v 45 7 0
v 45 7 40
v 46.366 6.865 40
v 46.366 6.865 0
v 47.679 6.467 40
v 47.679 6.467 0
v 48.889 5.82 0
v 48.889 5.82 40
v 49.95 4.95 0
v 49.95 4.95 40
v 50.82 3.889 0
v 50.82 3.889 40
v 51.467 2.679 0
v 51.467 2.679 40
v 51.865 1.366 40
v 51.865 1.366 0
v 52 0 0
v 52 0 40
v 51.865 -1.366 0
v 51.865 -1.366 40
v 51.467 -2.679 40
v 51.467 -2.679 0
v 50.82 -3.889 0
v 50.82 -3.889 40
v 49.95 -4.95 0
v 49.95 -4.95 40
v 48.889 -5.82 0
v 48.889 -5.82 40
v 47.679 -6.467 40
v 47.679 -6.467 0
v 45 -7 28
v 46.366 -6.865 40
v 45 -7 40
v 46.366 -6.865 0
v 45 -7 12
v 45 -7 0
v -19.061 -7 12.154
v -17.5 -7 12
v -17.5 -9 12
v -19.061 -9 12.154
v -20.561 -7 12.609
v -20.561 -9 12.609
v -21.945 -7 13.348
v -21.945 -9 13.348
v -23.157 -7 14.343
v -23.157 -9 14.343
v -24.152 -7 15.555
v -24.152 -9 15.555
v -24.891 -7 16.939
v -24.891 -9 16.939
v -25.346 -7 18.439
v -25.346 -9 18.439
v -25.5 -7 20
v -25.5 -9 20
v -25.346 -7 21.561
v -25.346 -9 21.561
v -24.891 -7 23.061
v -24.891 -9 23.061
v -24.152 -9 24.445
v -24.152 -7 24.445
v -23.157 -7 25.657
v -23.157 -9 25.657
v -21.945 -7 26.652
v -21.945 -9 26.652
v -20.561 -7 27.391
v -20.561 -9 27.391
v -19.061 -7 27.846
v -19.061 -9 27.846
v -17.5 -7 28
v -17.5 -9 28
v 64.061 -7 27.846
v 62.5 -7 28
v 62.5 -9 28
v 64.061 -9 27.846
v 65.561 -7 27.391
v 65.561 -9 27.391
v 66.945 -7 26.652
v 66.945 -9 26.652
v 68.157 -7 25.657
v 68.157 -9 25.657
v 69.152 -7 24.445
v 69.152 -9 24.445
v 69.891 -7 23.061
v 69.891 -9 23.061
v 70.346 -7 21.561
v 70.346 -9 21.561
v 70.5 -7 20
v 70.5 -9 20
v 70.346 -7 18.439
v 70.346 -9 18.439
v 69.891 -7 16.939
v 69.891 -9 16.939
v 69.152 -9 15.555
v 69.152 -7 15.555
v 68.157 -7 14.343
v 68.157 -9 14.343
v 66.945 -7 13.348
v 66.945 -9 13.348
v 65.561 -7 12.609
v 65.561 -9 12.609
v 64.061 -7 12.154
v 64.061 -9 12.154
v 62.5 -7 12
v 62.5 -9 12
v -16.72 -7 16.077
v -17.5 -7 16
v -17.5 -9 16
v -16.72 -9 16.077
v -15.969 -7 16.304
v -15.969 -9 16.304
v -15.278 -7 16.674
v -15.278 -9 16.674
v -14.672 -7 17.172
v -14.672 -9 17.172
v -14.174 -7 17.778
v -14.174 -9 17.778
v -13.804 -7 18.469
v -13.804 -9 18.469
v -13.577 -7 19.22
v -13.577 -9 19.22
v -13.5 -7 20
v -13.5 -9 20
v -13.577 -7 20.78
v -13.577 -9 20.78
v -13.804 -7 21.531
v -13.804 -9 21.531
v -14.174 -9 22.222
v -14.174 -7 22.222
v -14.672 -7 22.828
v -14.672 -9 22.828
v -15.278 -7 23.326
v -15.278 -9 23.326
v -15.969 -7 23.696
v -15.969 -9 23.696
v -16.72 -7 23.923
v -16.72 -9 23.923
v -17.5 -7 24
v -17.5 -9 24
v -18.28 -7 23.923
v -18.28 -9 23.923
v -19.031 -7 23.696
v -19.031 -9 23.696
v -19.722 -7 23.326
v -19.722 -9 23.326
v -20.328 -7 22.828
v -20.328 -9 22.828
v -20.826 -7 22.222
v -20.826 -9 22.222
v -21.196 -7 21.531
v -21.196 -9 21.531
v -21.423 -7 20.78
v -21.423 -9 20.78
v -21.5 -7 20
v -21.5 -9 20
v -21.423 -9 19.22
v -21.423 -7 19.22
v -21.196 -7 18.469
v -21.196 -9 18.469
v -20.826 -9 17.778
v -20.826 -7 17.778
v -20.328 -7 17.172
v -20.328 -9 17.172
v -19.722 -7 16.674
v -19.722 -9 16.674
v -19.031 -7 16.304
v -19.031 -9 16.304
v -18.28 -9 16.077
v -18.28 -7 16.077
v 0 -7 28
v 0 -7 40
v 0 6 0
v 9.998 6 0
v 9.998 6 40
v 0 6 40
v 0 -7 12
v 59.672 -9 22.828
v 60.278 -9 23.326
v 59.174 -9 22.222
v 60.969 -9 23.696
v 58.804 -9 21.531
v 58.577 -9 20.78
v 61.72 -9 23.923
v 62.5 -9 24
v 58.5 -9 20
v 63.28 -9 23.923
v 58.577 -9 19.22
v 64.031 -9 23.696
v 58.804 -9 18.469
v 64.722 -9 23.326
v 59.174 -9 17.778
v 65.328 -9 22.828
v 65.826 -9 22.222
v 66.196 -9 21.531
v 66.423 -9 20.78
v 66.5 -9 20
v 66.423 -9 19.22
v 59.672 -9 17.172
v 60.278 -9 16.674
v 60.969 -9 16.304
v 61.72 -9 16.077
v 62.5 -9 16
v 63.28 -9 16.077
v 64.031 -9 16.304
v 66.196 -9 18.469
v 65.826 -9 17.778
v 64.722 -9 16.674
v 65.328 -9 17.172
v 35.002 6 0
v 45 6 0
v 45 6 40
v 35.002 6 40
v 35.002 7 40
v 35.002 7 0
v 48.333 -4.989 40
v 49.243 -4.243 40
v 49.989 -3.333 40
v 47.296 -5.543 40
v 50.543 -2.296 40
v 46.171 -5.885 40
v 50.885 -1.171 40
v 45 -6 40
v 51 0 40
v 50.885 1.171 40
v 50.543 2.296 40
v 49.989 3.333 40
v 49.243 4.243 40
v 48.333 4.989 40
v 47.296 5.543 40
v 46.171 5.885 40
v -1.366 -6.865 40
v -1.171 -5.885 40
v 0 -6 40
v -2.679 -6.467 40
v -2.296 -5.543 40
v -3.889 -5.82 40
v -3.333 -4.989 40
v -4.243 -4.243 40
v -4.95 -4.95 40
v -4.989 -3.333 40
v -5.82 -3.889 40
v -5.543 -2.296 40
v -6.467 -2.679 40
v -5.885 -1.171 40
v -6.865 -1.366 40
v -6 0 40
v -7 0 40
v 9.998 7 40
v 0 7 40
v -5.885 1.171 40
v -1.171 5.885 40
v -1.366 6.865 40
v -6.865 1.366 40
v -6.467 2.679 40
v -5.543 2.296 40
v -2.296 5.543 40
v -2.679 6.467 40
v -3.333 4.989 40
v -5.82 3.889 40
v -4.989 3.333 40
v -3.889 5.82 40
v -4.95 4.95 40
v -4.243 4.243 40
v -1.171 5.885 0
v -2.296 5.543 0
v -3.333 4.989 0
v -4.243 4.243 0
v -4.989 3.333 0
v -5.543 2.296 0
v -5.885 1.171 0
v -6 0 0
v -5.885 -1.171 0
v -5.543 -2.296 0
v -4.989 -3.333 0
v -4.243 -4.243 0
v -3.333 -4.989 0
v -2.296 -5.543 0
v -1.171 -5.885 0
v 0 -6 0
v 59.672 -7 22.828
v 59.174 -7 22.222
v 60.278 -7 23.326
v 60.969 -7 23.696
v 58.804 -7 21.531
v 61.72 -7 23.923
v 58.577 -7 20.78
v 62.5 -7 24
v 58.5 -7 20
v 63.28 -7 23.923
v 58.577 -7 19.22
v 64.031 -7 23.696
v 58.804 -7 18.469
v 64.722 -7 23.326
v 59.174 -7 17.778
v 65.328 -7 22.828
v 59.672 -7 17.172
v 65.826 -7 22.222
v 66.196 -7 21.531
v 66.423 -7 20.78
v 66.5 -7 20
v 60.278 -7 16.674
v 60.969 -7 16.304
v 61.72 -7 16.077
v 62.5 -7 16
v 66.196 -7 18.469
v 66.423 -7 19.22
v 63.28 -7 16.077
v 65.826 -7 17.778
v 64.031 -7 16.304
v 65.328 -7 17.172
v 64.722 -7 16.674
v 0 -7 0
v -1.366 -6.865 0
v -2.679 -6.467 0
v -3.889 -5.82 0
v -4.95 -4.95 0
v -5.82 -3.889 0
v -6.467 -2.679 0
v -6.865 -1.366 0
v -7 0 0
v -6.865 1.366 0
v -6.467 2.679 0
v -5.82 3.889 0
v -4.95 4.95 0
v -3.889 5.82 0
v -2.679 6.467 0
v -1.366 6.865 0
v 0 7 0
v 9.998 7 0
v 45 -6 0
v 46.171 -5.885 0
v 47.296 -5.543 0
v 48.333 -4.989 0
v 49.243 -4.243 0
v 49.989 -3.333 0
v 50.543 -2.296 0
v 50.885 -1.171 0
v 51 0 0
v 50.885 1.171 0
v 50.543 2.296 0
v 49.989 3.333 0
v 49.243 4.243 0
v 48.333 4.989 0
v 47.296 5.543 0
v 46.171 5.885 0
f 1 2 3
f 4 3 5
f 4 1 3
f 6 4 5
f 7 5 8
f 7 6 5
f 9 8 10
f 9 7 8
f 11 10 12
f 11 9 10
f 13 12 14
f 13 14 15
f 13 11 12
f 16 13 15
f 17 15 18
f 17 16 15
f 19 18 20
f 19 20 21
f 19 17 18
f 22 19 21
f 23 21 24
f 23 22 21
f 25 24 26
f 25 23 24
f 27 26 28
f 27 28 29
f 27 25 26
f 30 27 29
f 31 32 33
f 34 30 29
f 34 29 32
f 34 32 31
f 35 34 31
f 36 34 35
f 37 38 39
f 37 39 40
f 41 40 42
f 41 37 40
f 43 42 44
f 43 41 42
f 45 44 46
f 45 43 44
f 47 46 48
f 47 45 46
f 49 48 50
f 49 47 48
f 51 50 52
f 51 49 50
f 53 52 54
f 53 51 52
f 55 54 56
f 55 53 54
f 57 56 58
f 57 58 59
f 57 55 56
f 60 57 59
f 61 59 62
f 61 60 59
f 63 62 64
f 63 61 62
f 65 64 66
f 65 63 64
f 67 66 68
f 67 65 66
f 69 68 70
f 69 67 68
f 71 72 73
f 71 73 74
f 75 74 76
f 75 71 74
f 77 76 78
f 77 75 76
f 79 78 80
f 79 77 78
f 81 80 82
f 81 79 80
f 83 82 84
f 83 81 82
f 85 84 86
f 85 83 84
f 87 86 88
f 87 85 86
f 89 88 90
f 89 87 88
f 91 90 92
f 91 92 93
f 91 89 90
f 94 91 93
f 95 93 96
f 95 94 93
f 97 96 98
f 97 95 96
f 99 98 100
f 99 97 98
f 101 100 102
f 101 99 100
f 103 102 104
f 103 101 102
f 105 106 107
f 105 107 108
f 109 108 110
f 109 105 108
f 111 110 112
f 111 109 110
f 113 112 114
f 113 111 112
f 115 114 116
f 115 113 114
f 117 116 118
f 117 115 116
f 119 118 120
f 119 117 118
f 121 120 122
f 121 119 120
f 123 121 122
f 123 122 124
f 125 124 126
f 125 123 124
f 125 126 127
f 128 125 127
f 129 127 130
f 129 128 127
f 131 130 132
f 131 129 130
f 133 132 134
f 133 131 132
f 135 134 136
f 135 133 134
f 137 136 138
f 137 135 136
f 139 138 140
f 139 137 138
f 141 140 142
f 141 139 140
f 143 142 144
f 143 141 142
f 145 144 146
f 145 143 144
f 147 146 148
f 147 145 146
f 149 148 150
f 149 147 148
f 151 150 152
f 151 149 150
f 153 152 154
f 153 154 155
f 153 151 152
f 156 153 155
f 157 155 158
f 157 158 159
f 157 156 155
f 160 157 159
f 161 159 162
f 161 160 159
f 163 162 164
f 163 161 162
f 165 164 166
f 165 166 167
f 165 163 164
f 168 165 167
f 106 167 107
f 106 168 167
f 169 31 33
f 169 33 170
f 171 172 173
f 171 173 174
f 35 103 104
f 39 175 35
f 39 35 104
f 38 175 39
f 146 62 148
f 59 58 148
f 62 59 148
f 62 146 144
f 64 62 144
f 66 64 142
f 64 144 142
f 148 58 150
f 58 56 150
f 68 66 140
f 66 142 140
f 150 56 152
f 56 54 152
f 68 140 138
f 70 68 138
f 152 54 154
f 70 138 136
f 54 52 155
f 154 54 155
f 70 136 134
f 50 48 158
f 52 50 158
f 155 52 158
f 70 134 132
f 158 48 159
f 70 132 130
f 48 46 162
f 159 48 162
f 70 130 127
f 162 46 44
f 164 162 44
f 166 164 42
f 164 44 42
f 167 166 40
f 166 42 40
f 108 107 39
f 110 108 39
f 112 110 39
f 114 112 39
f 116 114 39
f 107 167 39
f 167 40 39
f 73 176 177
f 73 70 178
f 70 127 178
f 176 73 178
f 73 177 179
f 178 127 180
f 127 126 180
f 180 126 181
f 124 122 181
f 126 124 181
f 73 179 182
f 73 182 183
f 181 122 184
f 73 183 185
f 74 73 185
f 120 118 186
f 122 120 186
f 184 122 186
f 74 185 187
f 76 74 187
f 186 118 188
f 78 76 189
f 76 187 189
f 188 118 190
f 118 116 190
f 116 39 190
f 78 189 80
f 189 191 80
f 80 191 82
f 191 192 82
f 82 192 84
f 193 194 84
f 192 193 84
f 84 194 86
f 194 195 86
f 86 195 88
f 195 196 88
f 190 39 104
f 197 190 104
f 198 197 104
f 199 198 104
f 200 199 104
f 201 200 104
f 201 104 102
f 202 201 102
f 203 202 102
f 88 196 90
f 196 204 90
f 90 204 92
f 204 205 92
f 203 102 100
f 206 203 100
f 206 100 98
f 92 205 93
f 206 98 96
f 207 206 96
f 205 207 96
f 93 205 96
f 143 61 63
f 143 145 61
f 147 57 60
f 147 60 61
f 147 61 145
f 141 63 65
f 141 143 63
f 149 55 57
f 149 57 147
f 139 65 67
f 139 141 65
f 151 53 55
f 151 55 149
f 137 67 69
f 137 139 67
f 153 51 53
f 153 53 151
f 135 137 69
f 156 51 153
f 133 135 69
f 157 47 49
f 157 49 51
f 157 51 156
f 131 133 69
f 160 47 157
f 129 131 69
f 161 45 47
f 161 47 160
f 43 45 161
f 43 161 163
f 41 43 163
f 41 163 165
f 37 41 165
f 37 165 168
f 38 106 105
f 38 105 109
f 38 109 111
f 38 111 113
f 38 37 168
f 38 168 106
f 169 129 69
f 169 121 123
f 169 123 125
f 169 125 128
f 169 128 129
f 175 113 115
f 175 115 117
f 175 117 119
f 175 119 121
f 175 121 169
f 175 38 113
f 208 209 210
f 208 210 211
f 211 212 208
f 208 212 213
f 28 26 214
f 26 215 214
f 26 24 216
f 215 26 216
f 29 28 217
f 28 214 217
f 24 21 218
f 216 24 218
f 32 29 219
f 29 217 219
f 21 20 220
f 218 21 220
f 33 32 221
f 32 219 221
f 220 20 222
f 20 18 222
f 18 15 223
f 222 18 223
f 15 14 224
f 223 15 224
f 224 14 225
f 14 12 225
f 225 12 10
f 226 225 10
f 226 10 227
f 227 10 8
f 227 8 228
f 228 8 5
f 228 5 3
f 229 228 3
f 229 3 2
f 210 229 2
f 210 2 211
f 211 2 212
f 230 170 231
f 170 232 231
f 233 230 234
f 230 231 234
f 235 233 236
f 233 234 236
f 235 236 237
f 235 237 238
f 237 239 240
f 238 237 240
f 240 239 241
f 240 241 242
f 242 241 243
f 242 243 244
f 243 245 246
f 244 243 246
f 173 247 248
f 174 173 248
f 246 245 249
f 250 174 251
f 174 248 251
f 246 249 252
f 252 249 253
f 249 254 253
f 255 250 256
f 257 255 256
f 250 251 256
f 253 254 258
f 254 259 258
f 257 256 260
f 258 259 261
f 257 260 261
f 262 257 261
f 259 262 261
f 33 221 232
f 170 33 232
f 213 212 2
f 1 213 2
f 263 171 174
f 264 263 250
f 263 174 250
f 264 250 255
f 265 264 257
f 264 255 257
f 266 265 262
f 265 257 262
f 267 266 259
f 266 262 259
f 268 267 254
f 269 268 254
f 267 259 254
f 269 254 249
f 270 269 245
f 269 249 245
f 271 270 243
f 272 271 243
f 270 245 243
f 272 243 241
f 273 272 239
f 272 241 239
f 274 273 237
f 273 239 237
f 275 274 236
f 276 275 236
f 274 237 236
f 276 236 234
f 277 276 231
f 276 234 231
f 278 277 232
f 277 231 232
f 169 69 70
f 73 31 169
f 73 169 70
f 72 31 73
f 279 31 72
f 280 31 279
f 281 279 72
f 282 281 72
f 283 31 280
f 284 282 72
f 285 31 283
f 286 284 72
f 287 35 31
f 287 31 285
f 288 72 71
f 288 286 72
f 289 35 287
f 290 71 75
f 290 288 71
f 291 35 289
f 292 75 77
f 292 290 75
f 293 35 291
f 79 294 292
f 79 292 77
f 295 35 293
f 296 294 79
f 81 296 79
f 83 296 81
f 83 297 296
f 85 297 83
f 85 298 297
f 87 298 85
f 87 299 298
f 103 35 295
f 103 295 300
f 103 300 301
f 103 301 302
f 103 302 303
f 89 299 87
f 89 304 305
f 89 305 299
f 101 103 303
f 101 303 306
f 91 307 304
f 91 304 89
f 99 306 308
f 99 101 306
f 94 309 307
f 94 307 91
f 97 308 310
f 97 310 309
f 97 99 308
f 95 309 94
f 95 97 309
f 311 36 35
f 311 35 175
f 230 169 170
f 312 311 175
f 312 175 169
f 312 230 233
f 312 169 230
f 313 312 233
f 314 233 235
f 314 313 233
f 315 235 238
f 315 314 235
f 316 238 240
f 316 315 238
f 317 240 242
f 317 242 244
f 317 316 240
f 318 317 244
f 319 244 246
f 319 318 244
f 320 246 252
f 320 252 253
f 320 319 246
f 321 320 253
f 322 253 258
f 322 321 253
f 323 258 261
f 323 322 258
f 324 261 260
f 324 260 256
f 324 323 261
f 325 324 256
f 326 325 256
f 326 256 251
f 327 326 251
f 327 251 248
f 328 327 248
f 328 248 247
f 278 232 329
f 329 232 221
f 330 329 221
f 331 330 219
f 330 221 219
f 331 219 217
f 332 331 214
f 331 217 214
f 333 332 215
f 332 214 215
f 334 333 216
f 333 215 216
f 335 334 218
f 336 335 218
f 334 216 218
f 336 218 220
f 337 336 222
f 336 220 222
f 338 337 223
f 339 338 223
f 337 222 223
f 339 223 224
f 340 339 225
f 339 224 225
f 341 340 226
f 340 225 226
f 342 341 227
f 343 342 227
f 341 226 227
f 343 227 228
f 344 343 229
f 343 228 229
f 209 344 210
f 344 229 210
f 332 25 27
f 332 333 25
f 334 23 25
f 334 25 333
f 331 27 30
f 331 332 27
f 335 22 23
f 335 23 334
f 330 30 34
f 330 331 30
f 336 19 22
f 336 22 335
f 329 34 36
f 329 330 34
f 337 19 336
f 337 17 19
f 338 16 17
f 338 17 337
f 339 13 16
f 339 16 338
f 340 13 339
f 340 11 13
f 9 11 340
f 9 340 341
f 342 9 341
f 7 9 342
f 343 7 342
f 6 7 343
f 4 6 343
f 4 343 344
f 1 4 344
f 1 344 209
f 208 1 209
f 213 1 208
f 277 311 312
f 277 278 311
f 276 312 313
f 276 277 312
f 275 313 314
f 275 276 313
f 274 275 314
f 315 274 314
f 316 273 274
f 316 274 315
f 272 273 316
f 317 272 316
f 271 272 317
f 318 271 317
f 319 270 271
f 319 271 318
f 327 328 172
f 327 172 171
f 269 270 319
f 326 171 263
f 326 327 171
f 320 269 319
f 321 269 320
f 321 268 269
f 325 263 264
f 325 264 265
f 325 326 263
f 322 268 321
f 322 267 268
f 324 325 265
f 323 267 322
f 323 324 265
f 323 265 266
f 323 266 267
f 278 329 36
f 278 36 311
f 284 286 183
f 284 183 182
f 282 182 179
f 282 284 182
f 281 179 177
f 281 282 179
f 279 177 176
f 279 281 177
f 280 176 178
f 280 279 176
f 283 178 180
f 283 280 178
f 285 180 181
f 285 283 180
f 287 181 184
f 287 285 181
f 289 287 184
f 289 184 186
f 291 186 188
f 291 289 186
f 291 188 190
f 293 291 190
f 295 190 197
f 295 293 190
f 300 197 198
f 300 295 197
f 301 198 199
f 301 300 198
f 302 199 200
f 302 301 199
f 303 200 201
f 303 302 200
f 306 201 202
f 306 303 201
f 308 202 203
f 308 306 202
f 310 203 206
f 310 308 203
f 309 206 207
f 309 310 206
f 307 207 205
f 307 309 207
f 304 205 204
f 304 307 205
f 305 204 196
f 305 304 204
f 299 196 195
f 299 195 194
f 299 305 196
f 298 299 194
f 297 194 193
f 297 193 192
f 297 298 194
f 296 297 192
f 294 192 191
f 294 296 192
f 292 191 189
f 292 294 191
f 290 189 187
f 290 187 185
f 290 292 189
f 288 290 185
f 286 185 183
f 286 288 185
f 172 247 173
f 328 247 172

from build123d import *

# Parameters (mm, degrees)
BOSS_EXTRU_1_DEPTH      = 40
ENL_V_MAT_EXTRU_1_DEPTH = 66.977268813
ESQUISSE3_W             = 25.003743198
ESQUISSE3_H             = 40
ENL_V_MAT_EXTRU_2_DEPTH = 1
ESQUISSE4_R             = 4
BOSS_EXTRU_2_DEPTH      = 2


with BuildPart() as part:
    # Esquisse1 → Boss.-Extru.1 (new body)
    with BuildSketch(Plane.XY):
        with BuildLine():
            Line((0, 7), (45, 7))
            ThreePointArc((45, 7), (52, 0), (45, -7))
            Line((45, -7), (0, -7))
            ThreePointArc((0, -7), (-7, 0), (0, 7))
        make_face()
    extrude(amount=BOSS_EXTRU_1_DEPTH)

    # Esquisse2 → Enlèv. mat.-Extru.1 (cut, through all)
    with BuildSketch(Plane.XY.offset(40)):
        with BuildLine():
            Line((0, -6), (45, -6))
            ThreePointArc((45, -6), (51, 0), (45, 6))
            Line((45, 6), (0, 6))
            ThreePointArc((0, 6), (-6, 0), (0, -6))
        make_face()
    extrude(amount=-ENL_V_MAT_EXTRU_1_DEPTH, mode=Mode.SUBTRACT)

    # Esquisse3 → Enlèv. mat.-Extru.2 (cut)
    with BuildSketch(Plane(origin=(0, 7, 0), x_dir=(1, 0, 0), z_dir=(0, 1, 0))):
        with Locations((22.5, -20)):
            Rectangle(ESQUISSE3_W, ESQUISSE3_H)
    extrude(amount=-ENL_V_MAT_EXTRU_2_DEPTH, mode=Mode.SUBTRACT)

    # Esquisse4 → Boss.-Extru.2 (add)
    with BuildSketch(Plane(origin=(0, -7, 0), x_dir=(-1, 0, 0), z_dir=(0, -1, 0))):
        with BuildLine():
            Line((-62.5, -12), (17.5, -12))
            ThreePointArc((17.5, -12), (25.5, -20), (17.5, -28))
            Line((17.5, -28), (-62.5, -28))
            ThreePointArc((-62.5, -28), (-70.5, -20), (-62.5, -12))
        make_face()
        with Locations(Location((17.5, -20, 0), (0, 0, 90))):
            Circle(ESQUISSE4_R, mode=Mode.SUBTRACT)
        with Locations(Location((-62.5, -20, 0), (0, 0, 270))):
            Circle(ESQUISSE4_R, mode=Mode.SUBTRACT)
    extrude(amount=BOSS_EXTRU_2_DEPTH)


solid = part.part
